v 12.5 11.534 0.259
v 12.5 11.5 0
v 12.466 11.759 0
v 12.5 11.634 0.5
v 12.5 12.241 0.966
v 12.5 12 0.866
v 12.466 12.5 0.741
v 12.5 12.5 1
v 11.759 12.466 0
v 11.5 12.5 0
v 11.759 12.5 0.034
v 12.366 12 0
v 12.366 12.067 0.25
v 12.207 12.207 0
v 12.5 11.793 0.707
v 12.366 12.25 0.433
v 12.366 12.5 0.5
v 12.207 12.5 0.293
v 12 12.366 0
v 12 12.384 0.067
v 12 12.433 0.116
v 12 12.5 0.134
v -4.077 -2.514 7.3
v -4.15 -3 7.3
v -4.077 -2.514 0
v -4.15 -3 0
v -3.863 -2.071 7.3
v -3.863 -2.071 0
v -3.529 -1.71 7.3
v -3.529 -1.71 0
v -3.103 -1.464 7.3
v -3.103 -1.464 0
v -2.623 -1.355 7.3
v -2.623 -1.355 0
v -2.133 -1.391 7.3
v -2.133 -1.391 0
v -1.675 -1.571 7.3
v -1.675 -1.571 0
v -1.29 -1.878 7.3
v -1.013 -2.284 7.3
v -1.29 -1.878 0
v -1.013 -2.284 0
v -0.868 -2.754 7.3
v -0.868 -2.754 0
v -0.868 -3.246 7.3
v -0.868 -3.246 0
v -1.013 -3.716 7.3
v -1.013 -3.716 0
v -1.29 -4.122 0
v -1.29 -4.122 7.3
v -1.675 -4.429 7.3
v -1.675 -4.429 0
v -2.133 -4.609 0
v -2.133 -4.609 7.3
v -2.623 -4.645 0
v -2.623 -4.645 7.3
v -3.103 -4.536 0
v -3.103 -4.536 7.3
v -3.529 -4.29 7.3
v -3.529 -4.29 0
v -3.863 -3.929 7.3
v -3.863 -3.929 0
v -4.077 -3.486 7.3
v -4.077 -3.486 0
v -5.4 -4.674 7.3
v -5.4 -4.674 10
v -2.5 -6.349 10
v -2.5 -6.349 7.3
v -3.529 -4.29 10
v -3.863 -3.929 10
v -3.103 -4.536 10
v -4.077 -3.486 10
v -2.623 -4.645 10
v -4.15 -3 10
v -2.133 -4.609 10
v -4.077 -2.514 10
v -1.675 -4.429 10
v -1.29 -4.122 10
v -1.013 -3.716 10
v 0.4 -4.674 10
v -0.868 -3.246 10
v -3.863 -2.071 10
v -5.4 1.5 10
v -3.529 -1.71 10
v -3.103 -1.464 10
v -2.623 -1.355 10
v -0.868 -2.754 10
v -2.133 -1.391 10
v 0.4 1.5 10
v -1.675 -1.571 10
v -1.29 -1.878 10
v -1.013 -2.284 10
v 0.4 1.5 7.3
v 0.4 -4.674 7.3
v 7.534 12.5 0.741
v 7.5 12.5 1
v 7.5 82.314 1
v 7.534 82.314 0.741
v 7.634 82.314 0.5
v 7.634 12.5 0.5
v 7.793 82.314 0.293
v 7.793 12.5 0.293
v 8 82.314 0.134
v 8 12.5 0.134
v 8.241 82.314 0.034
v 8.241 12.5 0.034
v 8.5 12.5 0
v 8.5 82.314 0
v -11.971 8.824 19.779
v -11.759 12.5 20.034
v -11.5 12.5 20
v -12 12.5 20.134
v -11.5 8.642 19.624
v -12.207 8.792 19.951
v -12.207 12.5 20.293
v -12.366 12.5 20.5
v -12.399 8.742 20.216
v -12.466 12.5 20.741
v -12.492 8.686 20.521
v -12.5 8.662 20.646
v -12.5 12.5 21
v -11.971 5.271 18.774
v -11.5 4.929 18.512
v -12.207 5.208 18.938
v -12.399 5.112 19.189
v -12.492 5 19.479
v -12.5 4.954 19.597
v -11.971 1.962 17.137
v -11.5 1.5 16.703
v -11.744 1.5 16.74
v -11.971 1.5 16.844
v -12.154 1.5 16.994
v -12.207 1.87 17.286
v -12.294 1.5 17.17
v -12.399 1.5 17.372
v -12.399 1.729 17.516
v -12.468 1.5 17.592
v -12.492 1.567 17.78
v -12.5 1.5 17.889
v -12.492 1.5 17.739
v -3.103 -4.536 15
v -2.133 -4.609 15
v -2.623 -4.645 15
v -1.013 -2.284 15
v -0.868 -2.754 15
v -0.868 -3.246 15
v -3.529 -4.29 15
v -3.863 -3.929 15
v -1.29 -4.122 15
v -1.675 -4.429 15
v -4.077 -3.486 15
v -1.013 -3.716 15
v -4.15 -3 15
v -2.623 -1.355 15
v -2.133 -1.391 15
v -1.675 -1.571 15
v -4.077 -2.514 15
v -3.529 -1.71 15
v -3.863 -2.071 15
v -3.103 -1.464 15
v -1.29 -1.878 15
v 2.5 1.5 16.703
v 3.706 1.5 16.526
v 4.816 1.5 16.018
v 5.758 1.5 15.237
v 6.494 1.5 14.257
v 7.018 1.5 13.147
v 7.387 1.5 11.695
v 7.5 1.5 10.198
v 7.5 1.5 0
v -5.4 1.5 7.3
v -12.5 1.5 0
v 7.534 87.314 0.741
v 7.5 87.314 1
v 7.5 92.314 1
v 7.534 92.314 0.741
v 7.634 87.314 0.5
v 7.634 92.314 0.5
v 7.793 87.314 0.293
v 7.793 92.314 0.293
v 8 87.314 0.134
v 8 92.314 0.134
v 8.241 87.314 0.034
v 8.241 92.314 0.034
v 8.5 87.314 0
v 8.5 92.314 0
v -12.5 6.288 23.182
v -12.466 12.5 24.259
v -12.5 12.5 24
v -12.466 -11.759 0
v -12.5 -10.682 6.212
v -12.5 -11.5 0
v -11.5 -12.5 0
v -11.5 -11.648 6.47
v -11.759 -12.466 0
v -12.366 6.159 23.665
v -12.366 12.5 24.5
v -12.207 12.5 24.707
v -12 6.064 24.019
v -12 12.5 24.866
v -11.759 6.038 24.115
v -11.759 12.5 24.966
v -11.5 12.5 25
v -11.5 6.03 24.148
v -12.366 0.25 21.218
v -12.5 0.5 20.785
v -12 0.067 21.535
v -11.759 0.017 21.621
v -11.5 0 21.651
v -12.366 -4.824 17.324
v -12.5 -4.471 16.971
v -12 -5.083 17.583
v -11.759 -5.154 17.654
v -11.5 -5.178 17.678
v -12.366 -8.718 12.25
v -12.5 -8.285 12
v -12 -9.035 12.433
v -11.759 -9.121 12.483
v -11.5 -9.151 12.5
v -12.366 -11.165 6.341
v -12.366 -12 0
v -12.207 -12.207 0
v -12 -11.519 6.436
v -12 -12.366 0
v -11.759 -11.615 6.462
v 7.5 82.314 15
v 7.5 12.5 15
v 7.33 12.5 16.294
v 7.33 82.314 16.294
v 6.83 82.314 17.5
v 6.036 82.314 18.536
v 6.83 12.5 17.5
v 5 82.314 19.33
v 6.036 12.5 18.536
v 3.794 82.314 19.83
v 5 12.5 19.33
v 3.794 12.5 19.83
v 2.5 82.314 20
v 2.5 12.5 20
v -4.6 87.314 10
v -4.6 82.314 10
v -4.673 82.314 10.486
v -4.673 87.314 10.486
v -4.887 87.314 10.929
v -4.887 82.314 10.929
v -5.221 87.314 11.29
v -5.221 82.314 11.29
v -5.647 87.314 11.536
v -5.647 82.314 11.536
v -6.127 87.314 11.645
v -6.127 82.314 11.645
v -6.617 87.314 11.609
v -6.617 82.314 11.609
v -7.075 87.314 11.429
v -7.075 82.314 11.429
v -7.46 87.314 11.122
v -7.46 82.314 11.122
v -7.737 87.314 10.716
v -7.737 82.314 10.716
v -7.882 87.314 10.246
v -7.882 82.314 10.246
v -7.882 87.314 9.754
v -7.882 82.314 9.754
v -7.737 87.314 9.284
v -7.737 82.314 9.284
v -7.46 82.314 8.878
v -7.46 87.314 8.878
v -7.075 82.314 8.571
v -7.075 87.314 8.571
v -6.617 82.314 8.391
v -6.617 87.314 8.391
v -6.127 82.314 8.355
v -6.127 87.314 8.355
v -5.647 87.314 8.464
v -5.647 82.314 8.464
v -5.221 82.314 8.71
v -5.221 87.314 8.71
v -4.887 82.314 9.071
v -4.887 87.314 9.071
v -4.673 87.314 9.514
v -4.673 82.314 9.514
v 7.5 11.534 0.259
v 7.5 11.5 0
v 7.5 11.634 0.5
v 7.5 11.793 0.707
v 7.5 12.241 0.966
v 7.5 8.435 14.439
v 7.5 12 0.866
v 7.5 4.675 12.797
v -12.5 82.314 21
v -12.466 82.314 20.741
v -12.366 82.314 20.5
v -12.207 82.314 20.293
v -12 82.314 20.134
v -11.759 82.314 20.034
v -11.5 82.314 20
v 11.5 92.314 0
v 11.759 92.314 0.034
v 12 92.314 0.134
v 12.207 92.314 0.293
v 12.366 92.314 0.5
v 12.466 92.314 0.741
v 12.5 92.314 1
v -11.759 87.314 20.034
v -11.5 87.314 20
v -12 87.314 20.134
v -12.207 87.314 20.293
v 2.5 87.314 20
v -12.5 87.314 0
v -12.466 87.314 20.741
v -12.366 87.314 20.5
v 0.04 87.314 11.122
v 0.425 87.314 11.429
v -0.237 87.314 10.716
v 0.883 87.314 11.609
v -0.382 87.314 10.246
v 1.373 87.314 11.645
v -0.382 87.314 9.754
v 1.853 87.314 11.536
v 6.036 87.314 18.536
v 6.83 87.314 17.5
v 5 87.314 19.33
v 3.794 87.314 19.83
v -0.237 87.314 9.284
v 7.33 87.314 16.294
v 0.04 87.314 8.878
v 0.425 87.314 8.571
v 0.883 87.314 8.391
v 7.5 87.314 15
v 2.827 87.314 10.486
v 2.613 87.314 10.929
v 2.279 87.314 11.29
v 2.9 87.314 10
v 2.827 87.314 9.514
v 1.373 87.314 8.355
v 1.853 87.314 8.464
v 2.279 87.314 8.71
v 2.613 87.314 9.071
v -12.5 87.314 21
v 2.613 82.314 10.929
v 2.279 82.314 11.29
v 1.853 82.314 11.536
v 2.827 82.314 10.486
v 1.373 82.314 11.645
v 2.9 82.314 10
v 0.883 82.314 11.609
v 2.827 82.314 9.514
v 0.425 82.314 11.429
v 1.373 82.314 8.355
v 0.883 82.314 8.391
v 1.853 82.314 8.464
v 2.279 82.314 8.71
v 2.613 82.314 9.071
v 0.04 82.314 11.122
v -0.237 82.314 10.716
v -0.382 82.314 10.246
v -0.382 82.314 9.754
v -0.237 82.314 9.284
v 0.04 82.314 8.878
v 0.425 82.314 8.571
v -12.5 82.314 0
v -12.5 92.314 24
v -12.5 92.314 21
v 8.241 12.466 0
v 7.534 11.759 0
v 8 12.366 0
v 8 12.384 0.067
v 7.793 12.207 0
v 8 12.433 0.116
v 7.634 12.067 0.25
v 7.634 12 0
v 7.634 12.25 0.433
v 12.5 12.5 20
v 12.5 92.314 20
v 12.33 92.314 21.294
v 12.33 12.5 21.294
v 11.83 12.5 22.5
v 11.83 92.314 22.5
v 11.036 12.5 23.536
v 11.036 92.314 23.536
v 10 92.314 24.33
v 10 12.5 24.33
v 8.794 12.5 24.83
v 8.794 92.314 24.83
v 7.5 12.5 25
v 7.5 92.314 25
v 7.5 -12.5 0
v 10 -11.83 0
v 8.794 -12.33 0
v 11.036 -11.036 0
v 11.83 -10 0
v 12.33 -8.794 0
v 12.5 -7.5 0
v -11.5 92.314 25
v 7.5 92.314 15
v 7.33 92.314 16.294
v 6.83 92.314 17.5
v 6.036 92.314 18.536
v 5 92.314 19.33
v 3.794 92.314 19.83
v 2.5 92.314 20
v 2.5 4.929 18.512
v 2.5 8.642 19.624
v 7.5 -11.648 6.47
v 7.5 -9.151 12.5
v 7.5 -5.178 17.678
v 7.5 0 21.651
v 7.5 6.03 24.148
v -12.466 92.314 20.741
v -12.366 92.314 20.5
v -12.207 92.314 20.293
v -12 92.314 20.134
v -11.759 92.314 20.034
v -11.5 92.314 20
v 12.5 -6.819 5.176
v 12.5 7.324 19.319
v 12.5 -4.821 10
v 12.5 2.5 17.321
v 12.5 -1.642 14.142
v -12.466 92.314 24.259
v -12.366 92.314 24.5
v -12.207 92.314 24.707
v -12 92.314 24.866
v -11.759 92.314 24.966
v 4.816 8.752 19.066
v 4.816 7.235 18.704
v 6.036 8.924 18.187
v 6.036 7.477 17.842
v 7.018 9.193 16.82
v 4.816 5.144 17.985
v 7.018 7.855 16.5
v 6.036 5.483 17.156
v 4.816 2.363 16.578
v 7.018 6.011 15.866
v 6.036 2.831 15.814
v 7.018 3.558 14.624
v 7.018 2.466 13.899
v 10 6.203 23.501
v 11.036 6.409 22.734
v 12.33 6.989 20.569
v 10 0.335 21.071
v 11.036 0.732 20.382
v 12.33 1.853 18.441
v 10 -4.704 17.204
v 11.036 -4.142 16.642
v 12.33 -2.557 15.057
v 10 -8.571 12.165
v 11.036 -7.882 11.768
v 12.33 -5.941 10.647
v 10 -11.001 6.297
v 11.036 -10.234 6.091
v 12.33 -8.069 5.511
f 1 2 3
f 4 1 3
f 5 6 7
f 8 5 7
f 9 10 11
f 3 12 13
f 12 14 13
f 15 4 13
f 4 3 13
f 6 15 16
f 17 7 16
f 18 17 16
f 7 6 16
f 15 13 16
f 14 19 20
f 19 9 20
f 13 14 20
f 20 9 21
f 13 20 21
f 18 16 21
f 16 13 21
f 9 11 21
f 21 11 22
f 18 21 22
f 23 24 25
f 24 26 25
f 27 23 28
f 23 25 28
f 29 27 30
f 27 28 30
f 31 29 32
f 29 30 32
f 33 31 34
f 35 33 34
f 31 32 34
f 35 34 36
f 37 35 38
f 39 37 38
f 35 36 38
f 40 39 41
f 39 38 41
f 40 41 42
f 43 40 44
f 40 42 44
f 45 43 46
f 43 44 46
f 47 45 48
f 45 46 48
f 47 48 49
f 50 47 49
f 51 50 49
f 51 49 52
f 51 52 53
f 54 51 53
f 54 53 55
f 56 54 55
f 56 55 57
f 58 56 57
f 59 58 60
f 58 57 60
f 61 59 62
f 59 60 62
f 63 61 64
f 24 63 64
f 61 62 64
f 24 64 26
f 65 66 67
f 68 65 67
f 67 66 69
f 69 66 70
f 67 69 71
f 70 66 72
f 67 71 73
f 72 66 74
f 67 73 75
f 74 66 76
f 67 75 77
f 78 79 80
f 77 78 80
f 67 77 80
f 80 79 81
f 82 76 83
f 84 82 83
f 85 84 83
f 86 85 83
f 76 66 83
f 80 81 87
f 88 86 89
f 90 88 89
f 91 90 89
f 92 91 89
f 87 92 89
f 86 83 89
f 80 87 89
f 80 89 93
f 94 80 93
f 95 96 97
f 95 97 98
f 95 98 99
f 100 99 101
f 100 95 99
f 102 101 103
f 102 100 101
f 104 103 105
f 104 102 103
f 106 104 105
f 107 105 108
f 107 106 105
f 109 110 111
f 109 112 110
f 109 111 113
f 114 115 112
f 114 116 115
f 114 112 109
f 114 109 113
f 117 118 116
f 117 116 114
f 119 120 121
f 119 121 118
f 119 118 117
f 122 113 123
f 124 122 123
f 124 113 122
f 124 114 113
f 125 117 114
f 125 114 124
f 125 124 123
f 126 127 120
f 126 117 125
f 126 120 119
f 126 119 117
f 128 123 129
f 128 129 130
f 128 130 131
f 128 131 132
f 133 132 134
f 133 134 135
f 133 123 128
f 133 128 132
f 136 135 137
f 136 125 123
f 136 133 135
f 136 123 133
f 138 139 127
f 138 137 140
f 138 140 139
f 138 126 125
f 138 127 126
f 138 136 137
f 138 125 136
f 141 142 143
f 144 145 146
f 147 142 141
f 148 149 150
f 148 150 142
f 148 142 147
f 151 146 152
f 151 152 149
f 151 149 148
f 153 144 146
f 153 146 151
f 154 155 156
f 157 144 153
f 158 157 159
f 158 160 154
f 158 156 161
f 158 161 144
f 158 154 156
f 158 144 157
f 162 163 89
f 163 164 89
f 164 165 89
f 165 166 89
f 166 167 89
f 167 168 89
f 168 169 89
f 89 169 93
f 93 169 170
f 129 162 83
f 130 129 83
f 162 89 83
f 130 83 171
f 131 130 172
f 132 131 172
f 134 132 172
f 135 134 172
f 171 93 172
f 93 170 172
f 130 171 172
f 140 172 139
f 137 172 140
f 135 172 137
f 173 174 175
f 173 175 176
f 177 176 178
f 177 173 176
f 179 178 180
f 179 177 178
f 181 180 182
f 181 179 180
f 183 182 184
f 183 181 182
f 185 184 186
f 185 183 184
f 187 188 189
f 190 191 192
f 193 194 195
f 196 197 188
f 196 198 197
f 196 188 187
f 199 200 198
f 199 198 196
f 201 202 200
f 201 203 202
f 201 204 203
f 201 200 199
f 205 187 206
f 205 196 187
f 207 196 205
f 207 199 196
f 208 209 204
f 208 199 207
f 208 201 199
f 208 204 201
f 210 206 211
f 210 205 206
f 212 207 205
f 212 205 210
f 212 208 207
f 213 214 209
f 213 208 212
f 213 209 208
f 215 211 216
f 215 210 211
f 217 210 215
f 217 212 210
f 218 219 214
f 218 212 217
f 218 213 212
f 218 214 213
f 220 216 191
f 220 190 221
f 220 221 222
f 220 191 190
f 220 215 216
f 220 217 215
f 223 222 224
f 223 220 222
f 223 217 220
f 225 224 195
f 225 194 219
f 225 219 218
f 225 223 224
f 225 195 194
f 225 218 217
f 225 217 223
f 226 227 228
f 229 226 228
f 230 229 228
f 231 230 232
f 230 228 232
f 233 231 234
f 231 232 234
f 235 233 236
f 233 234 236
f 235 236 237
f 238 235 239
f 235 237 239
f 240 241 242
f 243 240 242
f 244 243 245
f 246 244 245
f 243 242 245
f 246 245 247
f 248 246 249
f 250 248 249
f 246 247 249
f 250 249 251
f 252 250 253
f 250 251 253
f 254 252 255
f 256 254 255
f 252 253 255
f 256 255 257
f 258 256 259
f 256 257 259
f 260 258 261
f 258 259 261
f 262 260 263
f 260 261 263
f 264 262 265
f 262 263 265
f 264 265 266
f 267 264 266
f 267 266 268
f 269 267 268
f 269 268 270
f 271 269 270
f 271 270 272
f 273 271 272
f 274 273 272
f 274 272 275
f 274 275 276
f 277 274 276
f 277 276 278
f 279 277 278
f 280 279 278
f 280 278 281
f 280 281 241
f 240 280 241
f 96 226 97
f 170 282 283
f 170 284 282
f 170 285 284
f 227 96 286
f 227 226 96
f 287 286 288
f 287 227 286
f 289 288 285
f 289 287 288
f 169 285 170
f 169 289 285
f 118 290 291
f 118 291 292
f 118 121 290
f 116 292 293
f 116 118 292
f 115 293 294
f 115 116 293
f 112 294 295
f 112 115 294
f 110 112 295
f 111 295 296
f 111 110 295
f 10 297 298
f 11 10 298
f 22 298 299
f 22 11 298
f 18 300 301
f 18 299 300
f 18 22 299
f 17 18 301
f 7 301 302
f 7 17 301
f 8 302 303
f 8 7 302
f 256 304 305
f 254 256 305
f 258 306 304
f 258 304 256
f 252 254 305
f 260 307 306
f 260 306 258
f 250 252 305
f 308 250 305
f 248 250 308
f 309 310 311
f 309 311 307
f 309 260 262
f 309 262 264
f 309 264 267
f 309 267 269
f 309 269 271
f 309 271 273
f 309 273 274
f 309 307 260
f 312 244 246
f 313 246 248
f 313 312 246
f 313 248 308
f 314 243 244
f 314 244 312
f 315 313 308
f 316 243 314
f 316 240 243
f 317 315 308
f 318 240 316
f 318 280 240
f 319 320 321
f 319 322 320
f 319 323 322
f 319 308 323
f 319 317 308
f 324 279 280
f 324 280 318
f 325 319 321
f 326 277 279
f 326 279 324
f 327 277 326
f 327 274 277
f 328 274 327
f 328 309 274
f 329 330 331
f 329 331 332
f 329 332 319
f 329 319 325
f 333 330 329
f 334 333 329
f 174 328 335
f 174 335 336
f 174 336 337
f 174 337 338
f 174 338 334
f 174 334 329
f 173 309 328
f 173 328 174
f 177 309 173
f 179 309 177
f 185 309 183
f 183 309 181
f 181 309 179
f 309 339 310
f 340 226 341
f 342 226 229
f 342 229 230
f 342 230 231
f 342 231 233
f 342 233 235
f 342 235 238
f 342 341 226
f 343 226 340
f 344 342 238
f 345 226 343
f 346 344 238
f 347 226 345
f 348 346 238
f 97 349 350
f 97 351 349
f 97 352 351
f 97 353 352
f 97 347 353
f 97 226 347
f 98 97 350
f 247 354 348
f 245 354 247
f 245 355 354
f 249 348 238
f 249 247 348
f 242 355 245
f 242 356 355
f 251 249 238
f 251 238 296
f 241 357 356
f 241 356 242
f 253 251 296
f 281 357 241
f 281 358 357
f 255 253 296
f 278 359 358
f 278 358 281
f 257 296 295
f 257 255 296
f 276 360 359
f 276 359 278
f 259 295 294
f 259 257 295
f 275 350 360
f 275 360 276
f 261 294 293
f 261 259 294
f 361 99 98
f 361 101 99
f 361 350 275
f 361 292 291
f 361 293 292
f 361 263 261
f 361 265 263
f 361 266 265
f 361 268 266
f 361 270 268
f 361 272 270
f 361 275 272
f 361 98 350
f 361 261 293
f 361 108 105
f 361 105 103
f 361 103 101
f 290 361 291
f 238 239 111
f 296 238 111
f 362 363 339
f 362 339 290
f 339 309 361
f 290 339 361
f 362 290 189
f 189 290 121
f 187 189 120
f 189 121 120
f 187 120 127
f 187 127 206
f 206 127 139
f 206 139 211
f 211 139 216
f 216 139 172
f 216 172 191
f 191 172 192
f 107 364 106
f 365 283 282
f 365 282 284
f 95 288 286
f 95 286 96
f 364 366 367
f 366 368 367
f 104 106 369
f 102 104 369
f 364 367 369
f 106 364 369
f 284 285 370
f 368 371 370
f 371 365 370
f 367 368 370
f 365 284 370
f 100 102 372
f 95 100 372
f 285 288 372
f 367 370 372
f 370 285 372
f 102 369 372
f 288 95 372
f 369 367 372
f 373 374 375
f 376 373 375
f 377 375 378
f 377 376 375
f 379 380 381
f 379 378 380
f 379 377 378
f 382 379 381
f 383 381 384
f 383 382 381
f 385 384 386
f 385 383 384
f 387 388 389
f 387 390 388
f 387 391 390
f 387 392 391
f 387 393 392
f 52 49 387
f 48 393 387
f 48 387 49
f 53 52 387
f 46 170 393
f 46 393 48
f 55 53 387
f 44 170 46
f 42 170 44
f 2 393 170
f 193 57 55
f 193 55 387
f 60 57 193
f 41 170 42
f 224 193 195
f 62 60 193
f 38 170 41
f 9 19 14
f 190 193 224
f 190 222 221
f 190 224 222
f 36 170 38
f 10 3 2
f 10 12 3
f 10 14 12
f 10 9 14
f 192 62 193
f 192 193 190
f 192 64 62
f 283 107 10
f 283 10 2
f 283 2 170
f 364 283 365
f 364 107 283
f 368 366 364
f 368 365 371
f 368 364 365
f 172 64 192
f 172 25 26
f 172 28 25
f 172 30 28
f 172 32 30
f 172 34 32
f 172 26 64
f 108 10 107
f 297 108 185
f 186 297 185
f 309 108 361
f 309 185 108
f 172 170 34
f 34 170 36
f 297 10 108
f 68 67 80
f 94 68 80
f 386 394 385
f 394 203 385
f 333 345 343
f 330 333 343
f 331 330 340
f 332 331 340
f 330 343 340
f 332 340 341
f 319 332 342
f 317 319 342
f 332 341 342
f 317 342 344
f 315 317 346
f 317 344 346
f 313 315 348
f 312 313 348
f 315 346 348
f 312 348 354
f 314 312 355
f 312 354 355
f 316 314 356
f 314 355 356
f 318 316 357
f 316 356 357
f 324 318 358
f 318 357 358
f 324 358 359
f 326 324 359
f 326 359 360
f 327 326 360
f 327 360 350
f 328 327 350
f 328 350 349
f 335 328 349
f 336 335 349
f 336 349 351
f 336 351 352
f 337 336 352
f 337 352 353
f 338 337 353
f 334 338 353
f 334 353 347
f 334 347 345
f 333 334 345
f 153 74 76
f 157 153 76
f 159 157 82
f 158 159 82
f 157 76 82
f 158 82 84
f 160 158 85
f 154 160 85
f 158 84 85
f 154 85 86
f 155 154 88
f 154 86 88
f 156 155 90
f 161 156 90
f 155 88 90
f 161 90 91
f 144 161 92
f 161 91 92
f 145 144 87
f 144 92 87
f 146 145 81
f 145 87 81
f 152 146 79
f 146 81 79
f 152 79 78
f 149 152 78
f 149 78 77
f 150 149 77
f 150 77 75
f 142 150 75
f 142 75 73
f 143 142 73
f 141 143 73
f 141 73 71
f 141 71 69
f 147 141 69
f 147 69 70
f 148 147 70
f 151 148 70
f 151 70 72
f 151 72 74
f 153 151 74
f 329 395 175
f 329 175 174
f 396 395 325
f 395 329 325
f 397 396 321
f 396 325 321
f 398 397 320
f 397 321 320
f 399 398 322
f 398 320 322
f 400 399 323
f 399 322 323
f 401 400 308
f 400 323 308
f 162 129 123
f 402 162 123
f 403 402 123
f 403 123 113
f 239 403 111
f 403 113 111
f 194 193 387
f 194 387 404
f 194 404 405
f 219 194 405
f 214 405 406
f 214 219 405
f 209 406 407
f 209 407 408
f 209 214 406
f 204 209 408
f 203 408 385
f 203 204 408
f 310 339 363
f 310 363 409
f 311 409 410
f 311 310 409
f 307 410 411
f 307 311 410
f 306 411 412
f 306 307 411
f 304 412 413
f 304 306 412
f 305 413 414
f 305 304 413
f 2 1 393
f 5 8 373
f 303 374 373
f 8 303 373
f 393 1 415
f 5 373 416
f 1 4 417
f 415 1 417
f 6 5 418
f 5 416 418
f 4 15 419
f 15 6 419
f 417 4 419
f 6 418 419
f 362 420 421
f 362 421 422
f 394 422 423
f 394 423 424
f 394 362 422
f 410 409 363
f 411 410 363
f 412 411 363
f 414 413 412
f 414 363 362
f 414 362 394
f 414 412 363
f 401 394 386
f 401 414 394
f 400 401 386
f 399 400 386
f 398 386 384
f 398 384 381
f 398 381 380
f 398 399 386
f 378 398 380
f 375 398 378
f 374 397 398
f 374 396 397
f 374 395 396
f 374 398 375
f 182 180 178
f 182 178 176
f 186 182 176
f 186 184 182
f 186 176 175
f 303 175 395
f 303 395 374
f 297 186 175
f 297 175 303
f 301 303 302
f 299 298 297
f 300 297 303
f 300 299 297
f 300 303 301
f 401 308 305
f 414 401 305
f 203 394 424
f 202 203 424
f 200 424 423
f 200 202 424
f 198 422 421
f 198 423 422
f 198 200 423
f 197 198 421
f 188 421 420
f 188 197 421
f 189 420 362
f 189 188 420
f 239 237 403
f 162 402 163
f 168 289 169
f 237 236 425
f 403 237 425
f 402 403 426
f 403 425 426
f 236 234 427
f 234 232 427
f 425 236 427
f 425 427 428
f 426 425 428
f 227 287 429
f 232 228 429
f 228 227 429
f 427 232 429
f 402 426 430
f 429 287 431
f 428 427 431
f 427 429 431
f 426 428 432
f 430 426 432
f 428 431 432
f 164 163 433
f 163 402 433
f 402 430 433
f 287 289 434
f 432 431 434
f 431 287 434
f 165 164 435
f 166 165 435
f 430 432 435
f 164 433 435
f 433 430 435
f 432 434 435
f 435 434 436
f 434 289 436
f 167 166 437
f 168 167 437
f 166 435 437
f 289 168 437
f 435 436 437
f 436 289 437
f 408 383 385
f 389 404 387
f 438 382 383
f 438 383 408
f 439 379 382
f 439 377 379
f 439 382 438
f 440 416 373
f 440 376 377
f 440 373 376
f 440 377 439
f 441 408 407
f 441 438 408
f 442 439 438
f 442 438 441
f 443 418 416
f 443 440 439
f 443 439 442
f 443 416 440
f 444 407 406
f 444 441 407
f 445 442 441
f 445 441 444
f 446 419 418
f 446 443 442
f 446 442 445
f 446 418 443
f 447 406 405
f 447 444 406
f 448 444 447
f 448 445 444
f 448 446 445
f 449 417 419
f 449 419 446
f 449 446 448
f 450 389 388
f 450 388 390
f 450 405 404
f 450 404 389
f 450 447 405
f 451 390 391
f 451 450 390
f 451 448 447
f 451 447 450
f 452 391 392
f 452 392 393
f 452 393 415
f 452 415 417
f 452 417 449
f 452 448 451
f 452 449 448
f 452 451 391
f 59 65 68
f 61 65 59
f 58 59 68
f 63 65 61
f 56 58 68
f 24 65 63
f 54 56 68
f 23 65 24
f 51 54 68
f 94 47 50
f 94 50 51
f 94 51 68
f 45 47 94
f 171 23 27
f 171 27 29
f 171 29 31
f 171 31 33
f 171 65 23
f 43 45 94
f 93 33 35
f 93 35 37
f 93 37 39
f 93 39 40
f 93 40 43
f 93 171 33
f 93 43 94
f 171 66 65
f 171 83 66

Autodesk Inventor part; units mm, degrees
ref_plane "YZ Plane" through (0, 0, 0) normal (1, 0, 0) x (0, 1, 0)
ref_plane "XZ Plane" through (0, 0, 0) normal (0, 1, 0) x (-1, 0, 0)
ref_plane "XY Plane" through (0, 0, 0) normal (0, 0, 1) x (1, 0, 0)
ref_plane "Work Plane1" through (0, 0, 0) normal (0, 0, 1) x (1, 0, 0)
sketch "Sketch1" plane through (0, 0, 0) normal (0, 0, 1) x (1, 0, 0)
  arc A0 (12.5, 11.5) -> (11.5, 12.5) centre (11.5, 11.5) ccw projected
  line L0 (8.5, 12.5) -> (11.5, 12.5) projected
  arc A1 (8.5, 12.5) -> (7.5, 11.5) centre (8.5, 11.5) ccw projected
  line L1 (7.5, 1.5) -> (7.5, 11.5) projected
  arc A2 (-12.5, -11.5) -> (-11.5, -12.5) centre (-11.5, -11.5) ccw projected
  line L2 (7.5, -12.5) -> (-11.5, -12.5) projected
  arc A3 (7.5, -12.5) -> (12.5, -7.5) centre (7.5, -7.5) ccw projected
  line L3 (12.5, 11.5) -> (12.5, -7.5) projected
  arc A4 (-11.5, 1.5) -> (-12.5, 0.5) centre (-11.5, 0.5) ccw projected
  line L4 (-12.5, 0.5) -> (-12.5, -11.5) projected
  line L5 (7.5, 1.5) -> (-11.5, 1.5) projected
  circle A5 centre (-2.5, -3) radius 1.65 projected
  arc A6 (12.5, 11.5) -> (11.5, 12.5) centre (11.5, 11.5) ccw projected
  line L6 (12.5, -7.5) -> (12.5, 11.5) projected
  arc A7 (7.5, -12.5) -> (12.5, -7.5) centre (7.5, -7.5) ccw projected
  line L7 (1.0011, -12.5) -> (7.5, -12.5) projected
  line L8 (-6.0011, -12.5) -> (1.0011, -12.5) projected
  line L9 (-11.5, -12.5) -> (-6.0011, -12.5) projected
  arc A8 (-12.5, -11.5) -> (-11.5, -12.5) centre (-11.5, -11.5) ccw projected
  line L10 (-12.5, -8.5) -> (-12.5, -11.5) projected
  arc A9 (-11.5, -7.5) -> (-12.5, -8.5) centre (-11.5, -8.5) ccw projected
  line L11 (2.5, -7.5) -> (-11.5, -7.5) projected
  arc A10 (2.5, -7.5) -> (7.5, -2.5) centre (2.5, -2.5) ccw projected
  line L12 (7.5, 11.5) -> (7.5, -2.5) projected
  arc A11 (8.5, 12.5) -> (7.5, 11.5) centre (8.5, 11.5) ccw projected
  line L13 (8.5, 12.5) -> (11.5, 12.5) projected
revolve "Revolution1" add sketch "Sketch1" angle 90 about axis through (8.5, 12.5, 0) along (-1, 0, 0) contours L3 A3 L2 A2 L4 A9 L11 A10 L12 L1 A1 L0 A0
sketch "Sketch2" plane through (8.5, 12.5, 0) normal (0, 1, 0) x (1, 0, 0)
  line L0 (4, -20) -> (4, -1) projected
  arc A0 (4, -1) -> (3, 0) centre (3, -1) ccw projected
  line L1 (3, 0) -> (0, 0) projected
  arc A1 (0, 0) -> (-1, -1) centre (0, -1) ccw projected
  line L2 (-1, -1) -> (-1, -15) projected
  arc A2 (-21, -24) -> (-20, -25) centre (-20, -24) ccw projected
  line L3 (-20, -25) -> (-1, -25) projected
  arc A3 (-1, -25) -> (4, -20) centre (-1, -20) ccw projected
  line L4 (-21, -21) -> (-21, -24) projected
  line L5 (-6, -20) -> (-20, -20) projected
  arc A4 (-20, -20) -> (-21, -21) centre (-20, -21) ccw projected
  arc A5 (-6, -20) -> (-1, -15) centre (-6, -15) ccw projected
  point P0 (-8.5, 0)
extrude "Extrusion1" add sketch "Sketch2" along normal up to surface (79.8139 mm away)
sketch "Sketch5" plane through (7.5, -12.5, 0) normal (0, 0, -1) x (-1, 0, 0)
  line L0 (20, 99.8139) -> (-1, 99.8139)
  line L1 (-1, 99.8139) -> (-1, 94.8139)
  line L2 (-1, 94.8139) -> (20, 94.8139)
  line L3 (20, 94.8139) -> (20, 99.8139)
  line L4 (20, 25) -> (20, 104.8139) projected
  line L5 (19, 104.8139) -> (5, 104.8139) projected
  point P0 (7.5, 12.5)
  point P1 (-1, 104.8139)
  dimension "d10" = 5
  dimension "d11" = 5
extrude "Extrusion4" add sketch "Sketch5" against normal up to next
sketch "Sketch6" plane through (-12.5, 82.3139, 0) normal (0, -1, 0) x (1, 0, 0)
  circle A0 centre (13.75, 10) radius 1.65
  circle A1 centre (6.25, 10) radius 1.65
  line L0 (13.75, 10) -> (6.25, 10) construction
  line L1 (20, 15) -> (20, 1) projected
  line L2 (20, 2.0913) -> (0, 2.0913) construction
  line L3 (21, 0) -> (0, 0) projected
  line L4 (10, 0) -> (10, 20) construction
  line L5 (1, 20) -> (15, 20) projected
  line L6 (0, 0) -> (0, 21) projected
  point P0 (12.5, 0)
  point P1 (10, 2.0913)
  point P2 (10, 10)
  point P3 (20, 11)
  point P4 (0, 12)
  dimension "d14" = 7.5
  dimension "d15" = 3.3
extrude "Extrusion5" cut sketch "Sketch6" against normal through all
sketch "Sketch8" plane through (7.5, -12.5, 0) normal (0, 0, -1) x (-1, 0, 0)
  arc A0 (20, 4) -> (19, 5) centre (19, 4) ccw projected
  line L0 (-1, 25) -> (-1, 94.8139) projected
  line L1 (20, 4) -> (-1, 4)
  line L2 (-1, 4) -> (-1, 14)
  line L3 (-1, 14) -> (20, 14)
  line L4 (20, 14) -> (20, 4)
  point P0 (7.5, 12.5)
  dimension "d18" = 10
extrude "Extrusion6" add sketch "Sketch8" against normal up to next
sketch "Sketch9" plane through (7.5, -12.5, 0) normal (0, 0, -1) x (-1, 0, 0)
  circle A0 centre (10, 9.5) radius 1.65
  arc A1 (-4, 25) -> (-5, 24) centre (-4, 24) ccw projected
  line L0 (-1, 25) -> (-4, 25) projected
  arc A2 (0, 24) -> (-1, 25) centre (-1, 24) ccw projected
  line L1 (0, 14) -> (0, 24) projected
  arc A3 (19, 0) -> (20, 1) centre (19, 1) ccw projected
  line L2 (0, 0) -> (19, 0) projected
  arc A4 (-5, 5) -> (0, 0) centre (0, 5) ccw projected
  line L3 (-5, 24) -> (-5, 5) projected
  line L4 (20, 1) -> (20, 14) projected
  line L5 (20, 9.5) -> (0, 9.5) construction
  line L6 (10, 5) -> (10, 14) construction
  line L7 (20, 14) -> (0, 14) projected
  arc A5 (20, 13) -> (19, 14) centre (19, 13) ccw projected
  line L8 (20, 13) -> (20, 1) projected
  line L9 (0, 14) -> (19, 14) projected
  circle A6 centre (10, 9.5) radius 1.65 projected
  point P0 (7.5, 12.5)
  point P1 (20, 4)
  point P2 (10, 9.5)
  dimension "d21" = 3.3
extrude "Extrusion7" cut sketch "Sketch9" against normal blind 10 contours A0
sketch "Sketch11" plane through (-2.5, -3, 10) normal (0, 0, -1) x (-1, 0, 0)
  line L0 (0, -3.3486) -> (-2.9, -1.6743)
  line L1 (-2.9, -1.6743) -> (-2.9, 1.6743)
  line L2 (-2.9, 1.6743) -> (0, 3.3486)
  line L3 (0, 3.3486) -> (2.9, 1.6743)
  line L4 (2.9, 1.6743) -> (2.9, -1.6743)
  line L5 (2.9, -1.6743) -> (0, -3.3486)
  line L6 (0, 6.2514) -> (0, -6.2514) construction
  circle A0 centre (0, 0) radius 1.65 construction
  circle A1 centre (0, 0) radius 1.65
  point P0 (-2.5, 3)
  dimension "d27" = 9.6
  dimension "d28" = 5.8
extrude "Extrusion8" cut sketch "Sketch11" along normal blind 2.7
sketch "Sketch12" plane through (-12.5, 1.5, 0) normal (0, 1, 0) x (1, 0, 0)
  line L0 (7.1, -10) -> (10, -10) projected
  line L1 (10, -10) -> (12.9, -10) projected
  line L2 (12.9, -10) -> (10, -10) projected
  line L3 (10, -10) -> (7.1, -10) projected
  line L4 (7.1, -10) -> (7.1, -7.3)
  line L5 (7.1, -10) -> (7.1, -7.3) projected
  line L6 (7.1, -7.3) -> (12.9, -7.3)
  line L7 (12.9, -10) -> (12.9, -7.3) projected
  line L8 (12.9, -7.3) -> (12.9, -10)
  point P0 (12.5, 0)
  dimension "d31" = 2.7
extrude "Extrusion9" cut sketch "Sketch12" against normal up to next
sketch "Sketch13" plane through (7.5, -12.5, 10) normal (0, 0, -1) x (-1, 0, 0)
  circle A0 centre (10, 9.5) radius 1.65 projected
  circle A1 centre (10, 9.5) radius 1.65
  point P0 (7.5, 12.5)
extrude "Extrusion10" cut sketch "Sketch13" against normal blind 5
properties part number "frame-foot"
